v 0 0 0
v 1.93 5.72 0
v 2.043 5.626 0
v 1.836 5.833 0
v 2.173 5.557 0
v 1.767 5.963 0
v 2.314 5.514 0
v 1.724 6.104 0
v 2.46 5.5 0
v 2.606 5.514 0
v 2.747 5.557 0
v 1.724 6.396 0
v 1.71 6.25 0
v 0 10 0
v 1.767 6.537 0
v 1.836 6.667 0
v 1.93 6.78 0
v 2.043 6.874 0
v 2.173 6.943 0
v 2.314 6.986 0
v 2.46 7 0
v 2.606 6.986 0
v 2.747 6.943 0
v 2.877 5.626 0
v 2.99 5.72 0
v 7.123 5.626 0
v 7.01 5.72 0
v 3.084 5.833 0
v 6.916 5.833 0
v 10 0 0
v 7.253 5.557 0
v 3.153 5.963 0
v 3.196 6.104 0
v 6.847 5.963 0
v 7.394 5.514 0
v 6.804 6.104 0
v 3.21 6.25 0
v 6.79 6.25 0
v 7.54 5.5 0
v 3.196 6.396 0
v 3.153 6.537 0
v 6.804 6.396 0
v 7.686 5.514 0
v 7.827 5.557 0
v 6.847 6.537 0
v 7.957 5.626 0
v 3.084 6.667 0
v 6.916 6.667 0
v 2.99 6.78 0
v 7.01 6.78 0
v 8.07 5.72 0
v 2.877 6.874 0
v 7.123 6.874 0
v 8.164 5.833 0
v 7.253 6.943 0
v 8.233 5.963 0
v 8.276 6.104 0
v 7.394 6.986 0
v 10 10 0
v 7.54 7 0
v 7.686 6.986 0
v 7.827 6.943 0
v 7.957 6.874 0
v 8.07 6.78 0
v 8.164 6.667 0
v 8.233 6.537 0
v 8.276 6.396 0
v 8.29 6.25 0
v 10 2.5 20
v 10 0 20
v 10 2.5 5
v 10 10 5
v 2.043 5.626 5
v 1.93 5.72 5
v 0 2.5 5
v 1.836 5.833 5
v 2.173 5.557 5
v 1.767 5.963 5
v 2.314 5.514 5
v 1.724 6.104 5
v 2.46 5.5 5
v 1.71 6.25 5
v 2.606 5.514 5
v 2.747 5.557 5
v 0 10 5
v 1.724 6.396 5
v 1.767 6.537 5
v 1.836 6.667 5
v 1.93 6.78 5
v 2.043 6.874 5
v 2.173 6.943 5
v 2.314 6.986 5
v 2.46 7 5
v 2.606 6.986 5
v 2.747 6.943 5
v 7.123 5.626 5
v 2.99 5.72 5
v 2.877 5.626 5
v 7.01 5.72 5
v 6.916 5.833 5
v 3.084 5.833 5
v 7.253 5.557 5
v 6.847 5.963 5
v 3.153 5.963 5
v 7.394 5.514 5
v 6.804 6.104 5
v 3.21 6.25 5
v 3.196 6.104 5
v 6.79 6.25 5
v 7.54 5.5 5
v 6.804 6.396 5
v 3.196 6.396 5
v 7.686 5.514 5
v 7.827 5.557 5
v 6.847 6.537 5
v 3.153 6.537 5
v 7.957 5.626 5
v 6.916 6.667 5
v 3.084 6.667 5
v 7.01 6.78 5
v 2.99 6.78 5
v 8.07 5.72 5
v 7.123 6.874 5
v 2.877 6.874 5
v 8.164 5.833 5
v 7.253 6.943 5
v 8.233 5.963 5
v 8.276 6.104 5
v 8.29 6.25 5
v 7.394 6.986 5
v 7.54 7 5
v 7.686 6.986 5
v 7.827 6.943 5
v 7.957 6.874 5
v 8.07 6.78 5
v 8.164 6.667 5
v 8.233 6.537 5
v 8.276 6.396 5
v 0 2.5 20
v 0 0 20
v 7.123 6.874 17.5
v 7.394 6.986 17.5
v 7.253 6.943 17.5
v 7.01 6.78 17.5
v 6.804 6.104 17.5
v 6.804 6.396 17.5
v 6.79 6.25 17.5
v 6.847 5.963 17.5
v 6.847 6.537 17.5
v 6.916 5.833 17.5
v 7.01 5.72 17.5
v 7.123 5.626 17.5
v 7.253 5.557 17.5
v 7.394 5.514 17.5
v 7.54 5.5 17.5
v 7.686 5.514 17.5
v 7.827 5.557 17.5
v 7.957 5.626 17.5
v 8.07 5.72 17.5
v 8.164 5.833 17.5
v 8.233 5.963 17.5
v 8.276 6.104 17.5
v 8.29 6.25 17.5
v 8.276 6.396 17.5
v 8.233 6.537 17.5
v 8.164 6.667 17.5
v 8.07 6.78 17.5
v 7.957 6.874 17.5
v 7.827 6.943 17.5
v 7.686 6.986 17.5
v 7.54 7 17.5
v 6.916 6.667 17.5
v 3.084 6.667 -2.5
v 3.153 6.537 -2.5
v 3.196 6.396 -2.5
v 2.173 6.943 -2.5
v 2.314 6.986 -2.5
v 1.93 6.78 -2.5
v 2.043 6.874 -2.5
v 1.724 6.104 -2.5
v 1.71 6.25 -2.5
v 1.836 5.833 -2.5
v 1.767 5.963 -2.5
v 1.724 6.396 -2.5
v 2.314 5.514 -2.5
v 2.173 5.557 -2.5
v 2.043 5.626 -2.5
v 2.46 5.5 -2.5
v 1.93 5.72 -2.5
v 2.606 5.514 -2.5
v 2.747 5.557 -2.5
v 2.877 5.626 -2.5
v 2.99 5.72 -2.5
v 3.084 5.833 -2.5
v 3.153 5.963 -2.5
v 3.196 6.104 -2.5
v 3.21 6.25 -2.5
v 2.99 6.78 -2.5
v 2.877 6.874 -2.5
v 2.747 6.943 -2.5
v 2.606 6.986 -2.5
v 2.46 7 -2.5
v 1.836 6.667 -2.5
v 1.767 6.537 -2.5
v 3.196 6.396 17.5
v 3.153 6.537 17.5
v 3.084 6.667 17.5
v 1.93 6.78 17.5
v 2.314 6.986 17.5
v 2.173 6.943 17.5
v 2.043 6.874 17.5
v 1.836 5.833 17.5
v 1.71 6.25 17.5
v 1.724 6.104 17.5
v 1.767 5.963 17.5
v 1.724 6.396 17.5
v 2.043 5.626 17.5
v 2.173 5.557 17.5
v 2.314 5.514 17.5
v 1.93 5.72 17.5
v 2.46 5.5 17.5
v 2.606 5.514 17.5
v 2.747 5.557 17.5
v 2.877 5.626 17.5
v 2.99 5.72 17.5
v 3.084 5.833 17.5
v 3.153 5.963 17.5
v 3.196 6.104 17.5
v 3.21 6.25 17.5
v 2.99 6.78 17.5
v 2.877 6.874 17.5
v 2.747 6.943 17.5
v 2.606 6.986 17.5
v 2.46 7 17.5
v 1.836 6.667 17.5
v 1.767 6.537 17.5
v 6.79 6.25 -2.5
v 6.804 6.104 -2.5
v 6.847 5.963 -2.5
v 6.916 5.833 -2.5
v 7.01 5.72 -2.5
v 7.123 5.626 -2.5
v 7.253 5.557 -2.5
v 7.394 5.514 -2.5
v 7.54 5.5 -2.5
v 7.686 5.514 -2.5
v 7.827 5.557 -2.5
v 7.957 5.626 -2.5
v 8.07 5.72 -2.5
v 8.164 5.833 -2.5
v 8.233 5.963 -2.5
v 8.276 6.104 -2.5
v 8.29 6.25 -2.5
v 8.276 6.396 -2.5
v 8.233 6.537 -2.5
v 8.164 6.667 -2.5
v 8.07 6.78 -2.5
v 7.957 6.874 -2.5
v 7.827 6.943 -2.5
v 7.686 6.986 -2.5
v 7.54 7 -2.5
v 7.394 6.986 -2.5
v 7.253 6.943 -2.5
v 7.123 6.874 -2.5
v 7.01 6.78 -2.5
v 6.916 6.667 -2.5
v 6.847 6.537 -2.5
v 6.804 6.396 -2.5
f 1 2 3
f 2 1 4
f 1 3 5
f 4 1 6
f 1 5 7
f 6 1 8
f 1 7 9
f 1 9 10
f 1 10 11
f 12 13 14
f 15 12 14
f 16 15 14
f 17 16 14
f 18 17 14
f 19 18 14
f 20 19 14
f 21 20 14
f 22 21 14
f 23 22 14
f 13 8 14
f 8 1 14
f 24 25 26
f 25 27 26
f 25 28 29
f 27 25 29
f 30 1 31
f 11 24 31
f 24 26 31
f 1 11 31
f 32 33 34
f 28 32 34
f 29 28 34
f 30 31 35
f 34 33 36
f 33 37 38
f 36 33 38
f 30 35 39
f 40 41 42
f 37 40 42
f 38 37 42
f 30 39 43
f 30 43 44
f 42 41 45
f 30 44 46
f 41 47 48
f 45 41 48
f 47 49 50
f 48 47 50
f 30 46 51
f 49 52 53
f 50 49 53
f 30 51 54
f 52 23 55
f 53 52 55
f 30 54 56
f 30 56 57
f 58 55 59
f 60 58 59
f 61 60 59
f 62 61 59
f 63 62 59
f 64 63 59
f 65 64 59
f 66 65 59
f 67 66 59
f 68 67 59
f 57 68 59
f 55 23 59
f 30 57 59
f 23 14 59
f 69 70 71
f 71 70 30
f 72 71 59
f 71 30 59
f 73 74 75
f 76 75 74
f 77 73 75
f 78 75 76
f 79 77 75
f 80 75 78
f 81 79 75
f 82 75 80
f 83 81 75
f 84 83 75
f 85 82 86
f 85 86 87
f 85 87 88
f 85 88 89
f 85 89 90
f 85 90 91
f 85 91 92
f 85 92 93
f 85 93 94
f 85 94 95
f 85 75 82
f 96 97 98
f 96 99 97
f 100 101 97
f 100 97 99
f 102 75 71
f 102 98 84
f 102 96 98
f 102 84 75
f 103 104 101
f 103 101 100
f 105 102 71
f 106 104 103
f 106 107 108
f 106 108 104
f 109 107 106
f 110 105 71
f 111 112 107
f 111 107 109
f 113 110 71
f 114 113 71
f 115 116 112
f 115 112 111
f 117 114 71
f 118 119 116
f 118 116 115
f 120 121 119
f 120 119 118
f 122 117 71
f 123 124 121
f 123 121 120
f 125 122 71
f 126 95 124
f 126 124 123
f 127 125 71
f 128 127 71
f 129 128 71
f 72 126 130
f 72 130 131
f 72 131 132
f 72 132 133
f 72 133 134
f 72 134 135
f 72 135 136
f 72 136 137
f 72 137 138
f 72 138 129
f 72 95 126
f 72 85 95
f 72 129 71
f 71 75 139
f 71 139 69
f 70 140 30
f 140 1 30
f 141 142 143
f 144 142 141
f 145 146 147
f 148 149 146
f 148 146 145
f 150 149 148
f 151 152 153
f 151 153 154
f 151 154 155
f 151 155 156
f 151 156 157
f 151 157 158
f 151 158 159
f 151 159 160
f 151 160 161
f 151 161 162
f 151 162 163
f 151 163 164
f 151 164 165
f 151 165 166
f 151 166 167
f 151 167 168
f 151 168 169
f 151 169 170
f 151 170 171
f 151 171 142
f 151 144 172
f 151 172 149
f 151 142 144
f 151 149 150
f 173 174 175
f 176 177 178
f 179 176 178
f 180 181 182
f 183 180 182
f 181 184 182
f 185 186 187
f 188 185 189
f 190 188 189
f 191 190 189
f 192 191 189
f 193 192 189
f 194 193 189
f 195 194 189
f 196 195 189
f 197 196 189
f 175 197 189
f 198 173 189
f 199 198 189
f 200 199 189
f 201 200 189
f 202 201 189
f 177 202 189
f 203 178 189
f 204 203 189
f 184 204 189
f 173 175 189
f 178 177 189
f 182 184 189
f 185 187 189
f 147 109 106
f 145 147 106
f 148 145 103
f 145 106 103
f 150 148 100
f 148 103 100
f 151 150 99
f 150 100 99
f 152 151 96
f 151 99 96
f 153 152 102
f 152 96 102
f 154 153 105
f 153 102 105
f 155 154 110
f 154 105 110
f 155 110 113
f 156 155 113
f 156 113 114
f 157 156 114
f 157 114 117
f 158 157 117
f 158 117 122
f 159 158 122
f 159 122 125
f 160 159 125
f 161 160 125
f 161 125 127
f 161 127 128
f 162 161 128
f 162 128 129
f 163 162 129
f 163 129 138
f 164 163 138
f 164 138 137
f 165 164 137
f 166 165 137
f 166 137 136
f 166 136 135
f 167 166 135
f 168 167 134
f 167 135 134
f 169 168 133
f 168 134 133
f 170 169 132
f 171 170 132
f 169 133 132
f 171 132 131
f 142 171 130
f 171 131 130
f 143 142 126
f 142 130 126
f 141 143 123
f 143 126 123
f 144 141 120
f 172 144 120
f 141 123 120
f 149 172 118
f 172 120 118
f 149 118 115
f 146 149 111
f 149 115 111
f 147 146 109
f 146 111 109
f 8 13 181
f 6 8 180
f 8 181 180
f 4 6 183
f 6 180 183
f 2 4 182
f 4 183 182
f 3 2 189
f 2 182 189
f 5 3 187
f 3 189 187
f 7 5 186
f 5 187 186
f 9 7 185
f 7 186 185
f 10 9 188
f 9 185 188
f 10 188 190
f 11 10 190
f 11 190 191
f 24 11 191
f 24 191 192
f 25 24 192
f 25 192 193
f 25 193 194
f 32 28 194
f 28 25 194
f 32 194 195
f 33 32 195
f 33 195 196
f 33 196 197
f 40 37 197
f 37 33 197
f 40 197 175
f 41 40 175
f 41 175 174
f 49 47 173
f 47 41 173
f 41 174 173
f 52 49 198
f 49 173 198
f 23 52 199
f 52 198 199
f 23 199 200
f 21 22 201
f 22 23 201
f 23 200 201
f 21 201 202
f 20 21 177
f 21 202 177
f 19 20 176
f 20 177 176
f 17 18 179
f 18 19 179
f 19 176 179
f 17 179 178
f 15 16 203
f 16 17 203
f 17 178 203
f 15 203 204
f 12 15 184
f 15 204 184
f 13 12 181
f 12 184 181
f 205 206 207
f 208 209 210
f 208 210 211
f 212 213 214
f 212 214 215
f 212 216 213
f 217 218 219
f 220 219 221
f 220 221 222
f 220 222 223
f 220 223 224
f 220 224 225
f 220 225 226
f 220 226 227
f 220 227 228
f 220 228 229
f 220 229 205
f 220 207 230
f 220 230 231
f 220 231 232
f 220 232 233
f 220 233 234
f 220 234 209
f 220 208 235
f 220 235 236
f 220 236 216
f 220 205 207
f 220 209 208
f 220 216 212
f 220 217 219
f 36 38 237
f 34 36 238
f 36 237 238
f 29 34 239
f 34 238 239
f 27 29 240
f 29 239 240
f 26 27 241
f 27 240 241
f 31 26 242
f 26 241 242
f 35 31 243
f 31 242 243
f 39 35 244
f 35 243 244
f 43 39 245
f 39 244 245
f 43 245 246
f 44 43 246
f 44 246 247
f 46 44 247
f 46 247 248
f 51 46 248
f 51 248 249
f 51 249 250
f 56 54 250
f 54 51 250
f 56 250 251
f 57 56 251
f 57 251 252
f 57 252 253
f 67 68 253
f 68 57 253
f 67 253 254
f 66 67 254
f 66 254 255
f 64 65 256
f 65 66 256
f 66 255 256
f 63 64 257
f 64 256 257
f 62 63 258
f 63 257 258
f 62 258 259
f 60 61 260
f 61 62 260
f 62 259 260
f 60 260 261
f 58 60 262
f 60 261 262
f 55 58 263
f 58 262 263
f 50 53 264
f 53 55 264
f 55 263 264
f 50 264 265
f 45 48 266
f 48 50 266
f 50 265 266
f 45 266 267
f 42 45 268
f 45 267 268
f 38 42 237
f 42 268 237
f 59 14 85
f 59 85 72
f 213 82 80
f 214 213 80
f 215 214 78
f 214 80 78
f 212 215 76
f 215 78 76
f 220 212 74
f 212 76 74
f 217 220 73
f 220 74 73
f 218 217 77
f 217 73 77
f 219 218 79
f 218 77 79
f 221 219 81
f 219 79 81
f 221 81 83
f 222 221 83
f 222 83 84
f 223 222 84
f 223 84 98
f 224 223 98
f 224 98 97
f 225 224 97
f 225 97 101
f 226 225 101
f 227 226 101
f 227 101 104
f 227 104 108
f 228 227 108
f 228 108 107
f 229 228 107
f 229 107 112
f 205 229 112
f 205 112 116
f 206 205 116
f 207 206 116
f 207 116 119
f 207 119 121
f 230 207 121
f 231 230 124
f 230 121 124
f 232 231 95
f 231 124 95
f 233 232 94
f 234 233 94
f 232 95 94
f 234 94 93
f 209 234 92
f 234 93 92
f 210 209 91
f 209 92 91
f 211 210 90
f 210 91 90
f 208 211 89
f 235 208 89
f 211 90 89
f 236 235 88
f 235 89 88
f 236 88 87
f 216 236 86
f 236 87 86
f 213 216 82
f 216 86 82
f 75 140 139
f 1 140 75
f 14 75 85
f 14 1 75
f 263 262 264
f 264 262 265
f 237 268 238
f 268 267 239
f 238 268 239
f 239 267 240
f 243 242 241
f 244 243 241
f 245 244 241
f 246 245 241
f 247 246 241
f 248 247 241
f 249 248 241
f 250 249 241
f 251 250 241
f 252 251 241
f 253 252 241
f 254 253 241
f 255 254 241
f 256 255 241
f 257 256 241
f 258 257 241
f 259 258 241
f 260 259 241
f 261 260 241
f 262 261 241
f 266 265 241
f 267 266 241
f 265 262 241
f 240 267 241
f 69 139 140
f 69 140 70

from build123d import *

# Parameters (mm, degrees)
SKETCH_1_W           = 10
SKETCH_1_H           = 10
EXTRUDE_1_DEPTH      = 5
SKETCH_2_W           = 10
SKETCH_2_H           = 2.5
EXTRUDE_2_DEPTH      = 15
EXTRUDE_3_DEPTH      = 12.5
EXTRUDE_3_DEPTH_BACK = 7.5
SKETCH_3_R           = 0.75


with BuildPart() as part:
    # Эскиз1 → Вытянуть1 (new body)
    with BuildSketch(Plane.XY):
        with Locations((5, 5)):
            Rectangle(SKETCH_1_W, SKETCH_1_H)
    extrude(amount=EXTRUDE_1_DEPTH)

    # Эскиз2 → Вытянуть2 (add)
    with BuildSketch(Plane.XY.offset(5)):
        with Locations((5, 1.25)):
            Rectangle(SKETCH_2_W, SKETCH_2_H)
    extrude(amount=EXTRUDE_2_DEPTH)

    # Эскиз3 → Вытянуть3 (add, two sides: drawn at the far end of the back side and taken through both)
    with BuildSketch(Plane.XY.offset(5).offset(-EXTRUDE_3_DEPTH_BACK)):
        with Locations((7.54, 6.25)):
            Circle(SKETCH_3_R)
        with Locations((2.46, 6.25)):
            Circle(SKETCH_3_R)
    extrude(amount=EXTRUDE_3_DEPTH + EXTRUDE_3_DEPTH_BACK)


solid = part.part
